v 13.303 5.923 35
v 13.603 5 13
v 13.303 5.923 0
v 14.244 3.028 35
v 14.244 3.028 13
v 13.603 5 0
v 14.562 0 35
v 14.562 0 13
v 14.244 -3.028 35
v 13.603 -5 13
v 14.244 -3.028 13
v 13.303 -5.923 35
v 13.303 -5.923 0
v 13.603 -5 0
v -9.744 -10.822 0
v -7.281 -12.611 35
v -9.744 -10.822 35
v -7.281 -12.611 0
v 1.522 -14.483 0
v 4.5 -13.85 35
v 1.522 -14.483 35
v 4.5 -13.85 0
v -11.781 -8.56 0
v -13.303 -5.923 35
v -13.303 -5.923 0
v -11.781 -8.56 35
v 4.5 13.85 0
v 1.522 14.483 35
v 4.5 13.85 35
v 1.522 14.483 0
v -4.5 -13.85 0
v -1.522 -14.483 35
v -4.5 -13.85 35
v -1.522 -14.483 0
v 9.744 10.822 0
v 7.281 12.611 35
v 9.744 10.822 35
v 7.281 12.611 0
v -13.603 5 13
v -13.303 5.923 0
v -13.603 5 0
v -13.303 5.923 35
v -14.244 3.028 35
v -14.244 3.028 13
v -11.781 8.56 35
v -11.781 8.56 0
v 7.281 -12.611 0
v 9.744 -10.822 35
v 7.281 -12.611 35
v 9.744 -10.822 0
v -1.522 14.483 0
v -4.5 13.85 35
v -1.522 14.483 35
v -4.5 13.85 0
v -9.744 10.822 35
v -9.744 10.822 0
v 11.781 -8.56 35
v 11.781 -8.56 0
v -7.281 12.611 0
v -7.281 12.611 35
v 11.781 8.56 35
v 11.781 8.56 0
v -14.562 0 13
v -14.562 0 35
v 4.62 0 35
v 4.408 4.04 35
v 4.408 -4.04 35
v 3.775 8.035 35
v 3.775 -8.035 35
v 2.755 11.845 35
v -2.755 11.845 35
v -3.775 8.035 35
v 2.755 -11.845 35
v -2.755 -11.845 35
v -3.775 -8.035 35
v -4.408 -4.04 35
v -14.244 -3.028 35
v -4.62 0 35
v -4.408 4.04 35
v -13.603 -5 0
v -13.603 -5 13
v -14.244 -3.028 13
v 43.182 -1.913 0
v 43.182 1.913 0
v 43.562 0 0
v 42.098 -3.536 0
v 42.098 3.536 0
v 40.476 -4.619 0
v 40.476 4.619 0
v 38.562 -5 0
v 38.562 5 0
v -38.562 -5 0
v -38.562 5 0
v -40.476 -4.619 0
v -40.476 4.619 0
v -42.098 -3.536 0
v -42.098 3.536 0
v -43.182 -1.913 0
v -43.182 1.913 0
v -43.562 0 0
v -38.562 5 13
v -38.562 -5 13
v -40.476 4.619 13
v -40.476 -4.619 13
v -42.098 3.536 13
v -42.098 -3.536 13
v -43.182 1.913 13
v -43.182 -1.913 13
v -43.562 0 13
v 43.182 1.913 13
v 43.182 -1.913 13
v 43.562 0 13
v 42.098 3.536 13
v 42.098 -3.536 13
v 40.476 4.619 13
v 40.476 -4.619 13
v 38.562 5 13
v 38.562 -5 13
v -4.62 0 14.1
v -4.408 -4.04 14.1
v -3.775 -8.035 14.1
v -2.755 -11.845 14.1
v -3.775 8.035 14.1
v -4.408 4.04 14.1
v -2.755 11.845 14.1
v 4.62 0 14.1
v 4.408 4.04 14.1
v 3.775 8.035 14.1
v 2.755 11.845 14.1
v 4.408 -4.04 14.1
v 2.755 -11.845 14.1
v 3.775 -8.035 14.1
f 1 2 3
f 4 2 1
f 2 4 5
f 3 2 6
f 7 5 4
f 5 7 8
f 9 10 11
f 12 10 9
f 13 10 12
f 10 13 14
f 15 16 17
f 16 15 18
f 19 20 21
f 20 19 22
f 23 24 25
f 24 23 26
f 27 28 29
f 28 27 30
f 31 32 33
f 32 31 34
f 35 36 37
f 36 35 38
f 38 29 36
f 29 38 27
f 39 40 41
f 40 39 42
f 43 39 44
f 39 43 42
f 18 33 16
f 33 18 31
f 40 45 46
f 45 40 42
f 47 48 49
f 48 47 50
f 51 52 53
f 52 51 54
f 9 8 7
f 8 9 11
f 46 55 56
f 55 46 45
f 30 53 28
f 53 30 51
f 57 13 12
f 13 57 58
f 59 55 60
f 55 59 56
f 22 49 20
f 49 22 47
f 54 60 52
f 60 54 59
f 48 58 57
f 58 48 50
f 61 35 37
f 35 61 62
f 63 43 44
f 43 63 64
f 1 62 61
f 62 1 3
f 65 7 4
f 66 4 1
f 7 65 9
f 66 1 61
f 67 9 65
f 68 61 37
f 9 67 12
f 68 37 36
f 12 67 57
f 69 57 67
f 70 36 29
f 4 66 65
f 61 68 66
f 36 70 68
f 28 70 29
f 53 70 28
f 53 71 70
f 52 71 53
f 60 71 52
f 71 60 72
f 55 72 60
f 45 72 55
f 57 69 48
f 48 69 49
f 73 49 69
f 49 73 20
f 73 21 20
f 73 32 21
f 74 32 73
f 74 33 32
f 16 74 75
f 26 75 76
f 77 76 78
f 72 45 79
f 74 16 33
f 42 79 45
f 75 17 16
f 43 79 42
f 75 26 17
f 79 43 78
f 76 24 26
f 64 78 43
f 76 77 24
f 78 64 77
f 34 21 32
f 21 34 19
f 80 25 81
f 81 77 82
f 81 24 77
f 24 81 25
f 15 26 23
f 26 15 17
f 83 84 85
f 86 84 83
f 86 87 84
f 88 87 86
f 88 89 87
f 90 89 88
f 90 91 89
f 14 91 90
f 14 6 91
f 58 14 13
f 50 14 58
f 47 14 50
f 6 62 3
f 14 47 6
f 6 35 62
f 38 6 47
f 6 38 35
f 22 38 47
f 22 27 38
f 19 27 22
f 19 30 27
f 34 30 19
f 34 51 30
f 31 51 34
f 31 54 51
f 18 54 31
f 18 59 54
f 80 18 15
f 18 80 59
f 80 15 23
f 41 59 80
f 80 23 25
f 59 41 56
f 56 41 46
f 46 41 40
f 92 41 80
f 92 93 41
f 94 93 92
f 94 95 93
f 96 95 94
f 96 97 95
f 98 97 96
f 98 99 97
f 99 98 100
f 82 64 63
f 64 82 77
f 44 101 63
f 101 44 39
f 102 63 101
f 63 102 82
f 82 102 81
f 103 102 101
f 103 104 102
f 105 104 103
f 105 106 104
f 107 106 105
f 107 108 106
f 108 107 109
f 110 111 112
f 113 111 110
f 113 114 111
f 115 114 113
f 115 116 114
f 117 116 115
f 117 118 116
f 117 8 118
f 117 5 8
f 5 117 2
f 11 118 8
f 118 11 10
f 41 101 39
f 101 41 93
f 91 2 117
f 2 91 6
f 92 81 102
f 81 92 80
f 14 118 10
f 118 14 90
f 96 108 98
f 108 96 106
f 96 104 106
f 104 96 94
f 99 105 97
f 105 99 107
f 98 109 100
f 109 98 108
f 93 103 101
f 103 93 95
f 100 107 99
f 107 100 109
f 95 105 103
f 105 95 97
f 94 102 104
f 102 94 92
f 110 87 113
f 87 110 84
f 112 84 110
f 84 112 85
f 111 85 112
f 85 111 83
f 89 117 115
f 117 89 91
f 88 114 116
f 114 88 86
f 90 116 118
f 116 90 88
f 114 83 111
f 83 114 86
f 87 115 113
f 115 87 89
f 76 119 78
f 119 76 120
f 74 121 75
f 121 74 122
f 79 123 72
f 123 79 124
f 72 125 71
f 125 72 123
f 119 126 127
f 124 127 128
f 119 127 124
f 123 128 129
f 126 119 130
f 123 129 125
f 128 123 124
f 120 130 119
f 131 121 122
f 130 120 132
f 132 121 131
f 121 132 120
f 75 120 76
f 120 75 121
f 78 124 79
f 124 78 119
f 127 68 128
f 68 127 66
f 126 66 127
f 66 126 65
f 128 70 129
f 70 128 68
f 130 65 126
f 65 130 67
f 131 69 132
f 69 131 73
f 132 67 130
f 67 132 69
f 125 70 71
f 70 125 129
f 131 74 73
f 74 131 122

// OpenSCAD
cylinder_height = 35;
wall_thickness = 2.4;

handle_height = 13;
handle_length = 24;
handle_thickness = 10;

hole_desired_height = 20.4;
hole_desired_width = 22.69;
hole_desired_middle_thickness = 8.24;
hole_desired_outer_thickness = 4.52;

tolerance = 0.5;

hole_height = hole_desired_height + tolerance;
hole_width = hole_desired_width + 2*tolerance;
hole_middle_thickness = hole_desired_middle_thickness + 2*tolerance;
hole_outer_thickness = hole_desired_outer_thickness + 2*tolerance;

cylinder_radius = wall_thickness + sqrt(pow(hole_outer_thickness / 2,2) +pow(hole_width/2,2));

nudge = 0.01;

module main() {
    cylinder(h=cylinder_height, r=cylinder_radius);
    translate([-handle_length-cylinder_radius,-handle_thickness/2,0]) cube([2*handle_length+2*cylinder_radius,handle_thickness,handle_height]);
    translate([-handle_length-cylinder_radius,0,0]) cylinder(h=handle_height, d=handle_thickness);
    translate([handle_length+cylinder_radius,0,0]) cylinder(h=handle_height, d=handle_thickness);
}

module hole() {
    delta = (hole_middle_thickness - hole_outer_thickness)/2;
    a = hole_width / 2;
    r = (a*a+delta*delta)/(2*delta);
    render(convexity=5)
    translate([0,0,cylinder_height-hole_height]) 
    intersection() {
    translate([r-delta-hole_outer_thickness/2,0,0]) cylinder(r=r, h=hole_height+nudge,$fn=60);
    translate([-r+delta+hole_outer_thickness/2,0,0]) cylinder(r=r, h=hole_height+nudge,$fn=60);
    translate([0,0,hole_height/2]) cube(center=true,[hole_middle_thickness,hole_width,hole_height+nudge]);
    }
}

difference() {
render(convexity=15)
    main();
render(convexity=15)
    hole();
}
